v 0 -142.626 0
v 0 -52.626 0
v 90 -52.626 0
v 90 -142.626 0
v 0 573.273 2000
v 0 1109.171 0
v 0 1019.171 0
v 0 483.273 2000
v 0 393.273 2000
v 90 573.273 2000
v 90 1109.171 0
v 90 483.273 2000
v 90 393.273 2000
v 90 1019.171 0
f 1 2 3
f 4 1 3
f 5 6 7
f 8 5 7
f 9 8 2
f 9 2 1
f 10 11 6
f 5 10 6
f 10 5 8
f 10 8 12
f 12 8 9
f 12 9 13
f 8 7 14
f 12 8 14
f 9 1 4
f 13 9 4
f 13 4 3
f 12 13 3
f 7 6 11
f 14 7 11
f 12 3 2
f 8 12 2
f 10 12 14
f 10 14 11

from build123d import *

# Parameters (mm, degrees)
F1_W = 90
F1_H = 90


with BuildPart() as f2:
    # F2: sweep along a path in F0
    with BuildLine(Plane.YZ) as f2_path:
        Line((483.272865, 2000), (1019.17125, 0))
    # F1 (on Top) → F2 (sweep)
    with BuildSketch(Plane.XY):
        with Locations((45, 1064.17125)):
            Rectangle(F1_W, F1_H)
    sweep(path=f2_path.line)


with BuildPart() as f3:
    # F3: sweep along a path in F0
    with BuildLine(Plane.YZ) as f3_path:
        Line((483.272865, 2000), (-52.625519, 0))
    # F1 (on Top) → F3 (sweep)
    with BuildSketch(Plane.XY):
        with Locations((45, -97.625519)):
            Rectangle(F1_W, F1_H)
    sweep(path=f3_path.line)


solid = Compound([f2.part, f3.part])
